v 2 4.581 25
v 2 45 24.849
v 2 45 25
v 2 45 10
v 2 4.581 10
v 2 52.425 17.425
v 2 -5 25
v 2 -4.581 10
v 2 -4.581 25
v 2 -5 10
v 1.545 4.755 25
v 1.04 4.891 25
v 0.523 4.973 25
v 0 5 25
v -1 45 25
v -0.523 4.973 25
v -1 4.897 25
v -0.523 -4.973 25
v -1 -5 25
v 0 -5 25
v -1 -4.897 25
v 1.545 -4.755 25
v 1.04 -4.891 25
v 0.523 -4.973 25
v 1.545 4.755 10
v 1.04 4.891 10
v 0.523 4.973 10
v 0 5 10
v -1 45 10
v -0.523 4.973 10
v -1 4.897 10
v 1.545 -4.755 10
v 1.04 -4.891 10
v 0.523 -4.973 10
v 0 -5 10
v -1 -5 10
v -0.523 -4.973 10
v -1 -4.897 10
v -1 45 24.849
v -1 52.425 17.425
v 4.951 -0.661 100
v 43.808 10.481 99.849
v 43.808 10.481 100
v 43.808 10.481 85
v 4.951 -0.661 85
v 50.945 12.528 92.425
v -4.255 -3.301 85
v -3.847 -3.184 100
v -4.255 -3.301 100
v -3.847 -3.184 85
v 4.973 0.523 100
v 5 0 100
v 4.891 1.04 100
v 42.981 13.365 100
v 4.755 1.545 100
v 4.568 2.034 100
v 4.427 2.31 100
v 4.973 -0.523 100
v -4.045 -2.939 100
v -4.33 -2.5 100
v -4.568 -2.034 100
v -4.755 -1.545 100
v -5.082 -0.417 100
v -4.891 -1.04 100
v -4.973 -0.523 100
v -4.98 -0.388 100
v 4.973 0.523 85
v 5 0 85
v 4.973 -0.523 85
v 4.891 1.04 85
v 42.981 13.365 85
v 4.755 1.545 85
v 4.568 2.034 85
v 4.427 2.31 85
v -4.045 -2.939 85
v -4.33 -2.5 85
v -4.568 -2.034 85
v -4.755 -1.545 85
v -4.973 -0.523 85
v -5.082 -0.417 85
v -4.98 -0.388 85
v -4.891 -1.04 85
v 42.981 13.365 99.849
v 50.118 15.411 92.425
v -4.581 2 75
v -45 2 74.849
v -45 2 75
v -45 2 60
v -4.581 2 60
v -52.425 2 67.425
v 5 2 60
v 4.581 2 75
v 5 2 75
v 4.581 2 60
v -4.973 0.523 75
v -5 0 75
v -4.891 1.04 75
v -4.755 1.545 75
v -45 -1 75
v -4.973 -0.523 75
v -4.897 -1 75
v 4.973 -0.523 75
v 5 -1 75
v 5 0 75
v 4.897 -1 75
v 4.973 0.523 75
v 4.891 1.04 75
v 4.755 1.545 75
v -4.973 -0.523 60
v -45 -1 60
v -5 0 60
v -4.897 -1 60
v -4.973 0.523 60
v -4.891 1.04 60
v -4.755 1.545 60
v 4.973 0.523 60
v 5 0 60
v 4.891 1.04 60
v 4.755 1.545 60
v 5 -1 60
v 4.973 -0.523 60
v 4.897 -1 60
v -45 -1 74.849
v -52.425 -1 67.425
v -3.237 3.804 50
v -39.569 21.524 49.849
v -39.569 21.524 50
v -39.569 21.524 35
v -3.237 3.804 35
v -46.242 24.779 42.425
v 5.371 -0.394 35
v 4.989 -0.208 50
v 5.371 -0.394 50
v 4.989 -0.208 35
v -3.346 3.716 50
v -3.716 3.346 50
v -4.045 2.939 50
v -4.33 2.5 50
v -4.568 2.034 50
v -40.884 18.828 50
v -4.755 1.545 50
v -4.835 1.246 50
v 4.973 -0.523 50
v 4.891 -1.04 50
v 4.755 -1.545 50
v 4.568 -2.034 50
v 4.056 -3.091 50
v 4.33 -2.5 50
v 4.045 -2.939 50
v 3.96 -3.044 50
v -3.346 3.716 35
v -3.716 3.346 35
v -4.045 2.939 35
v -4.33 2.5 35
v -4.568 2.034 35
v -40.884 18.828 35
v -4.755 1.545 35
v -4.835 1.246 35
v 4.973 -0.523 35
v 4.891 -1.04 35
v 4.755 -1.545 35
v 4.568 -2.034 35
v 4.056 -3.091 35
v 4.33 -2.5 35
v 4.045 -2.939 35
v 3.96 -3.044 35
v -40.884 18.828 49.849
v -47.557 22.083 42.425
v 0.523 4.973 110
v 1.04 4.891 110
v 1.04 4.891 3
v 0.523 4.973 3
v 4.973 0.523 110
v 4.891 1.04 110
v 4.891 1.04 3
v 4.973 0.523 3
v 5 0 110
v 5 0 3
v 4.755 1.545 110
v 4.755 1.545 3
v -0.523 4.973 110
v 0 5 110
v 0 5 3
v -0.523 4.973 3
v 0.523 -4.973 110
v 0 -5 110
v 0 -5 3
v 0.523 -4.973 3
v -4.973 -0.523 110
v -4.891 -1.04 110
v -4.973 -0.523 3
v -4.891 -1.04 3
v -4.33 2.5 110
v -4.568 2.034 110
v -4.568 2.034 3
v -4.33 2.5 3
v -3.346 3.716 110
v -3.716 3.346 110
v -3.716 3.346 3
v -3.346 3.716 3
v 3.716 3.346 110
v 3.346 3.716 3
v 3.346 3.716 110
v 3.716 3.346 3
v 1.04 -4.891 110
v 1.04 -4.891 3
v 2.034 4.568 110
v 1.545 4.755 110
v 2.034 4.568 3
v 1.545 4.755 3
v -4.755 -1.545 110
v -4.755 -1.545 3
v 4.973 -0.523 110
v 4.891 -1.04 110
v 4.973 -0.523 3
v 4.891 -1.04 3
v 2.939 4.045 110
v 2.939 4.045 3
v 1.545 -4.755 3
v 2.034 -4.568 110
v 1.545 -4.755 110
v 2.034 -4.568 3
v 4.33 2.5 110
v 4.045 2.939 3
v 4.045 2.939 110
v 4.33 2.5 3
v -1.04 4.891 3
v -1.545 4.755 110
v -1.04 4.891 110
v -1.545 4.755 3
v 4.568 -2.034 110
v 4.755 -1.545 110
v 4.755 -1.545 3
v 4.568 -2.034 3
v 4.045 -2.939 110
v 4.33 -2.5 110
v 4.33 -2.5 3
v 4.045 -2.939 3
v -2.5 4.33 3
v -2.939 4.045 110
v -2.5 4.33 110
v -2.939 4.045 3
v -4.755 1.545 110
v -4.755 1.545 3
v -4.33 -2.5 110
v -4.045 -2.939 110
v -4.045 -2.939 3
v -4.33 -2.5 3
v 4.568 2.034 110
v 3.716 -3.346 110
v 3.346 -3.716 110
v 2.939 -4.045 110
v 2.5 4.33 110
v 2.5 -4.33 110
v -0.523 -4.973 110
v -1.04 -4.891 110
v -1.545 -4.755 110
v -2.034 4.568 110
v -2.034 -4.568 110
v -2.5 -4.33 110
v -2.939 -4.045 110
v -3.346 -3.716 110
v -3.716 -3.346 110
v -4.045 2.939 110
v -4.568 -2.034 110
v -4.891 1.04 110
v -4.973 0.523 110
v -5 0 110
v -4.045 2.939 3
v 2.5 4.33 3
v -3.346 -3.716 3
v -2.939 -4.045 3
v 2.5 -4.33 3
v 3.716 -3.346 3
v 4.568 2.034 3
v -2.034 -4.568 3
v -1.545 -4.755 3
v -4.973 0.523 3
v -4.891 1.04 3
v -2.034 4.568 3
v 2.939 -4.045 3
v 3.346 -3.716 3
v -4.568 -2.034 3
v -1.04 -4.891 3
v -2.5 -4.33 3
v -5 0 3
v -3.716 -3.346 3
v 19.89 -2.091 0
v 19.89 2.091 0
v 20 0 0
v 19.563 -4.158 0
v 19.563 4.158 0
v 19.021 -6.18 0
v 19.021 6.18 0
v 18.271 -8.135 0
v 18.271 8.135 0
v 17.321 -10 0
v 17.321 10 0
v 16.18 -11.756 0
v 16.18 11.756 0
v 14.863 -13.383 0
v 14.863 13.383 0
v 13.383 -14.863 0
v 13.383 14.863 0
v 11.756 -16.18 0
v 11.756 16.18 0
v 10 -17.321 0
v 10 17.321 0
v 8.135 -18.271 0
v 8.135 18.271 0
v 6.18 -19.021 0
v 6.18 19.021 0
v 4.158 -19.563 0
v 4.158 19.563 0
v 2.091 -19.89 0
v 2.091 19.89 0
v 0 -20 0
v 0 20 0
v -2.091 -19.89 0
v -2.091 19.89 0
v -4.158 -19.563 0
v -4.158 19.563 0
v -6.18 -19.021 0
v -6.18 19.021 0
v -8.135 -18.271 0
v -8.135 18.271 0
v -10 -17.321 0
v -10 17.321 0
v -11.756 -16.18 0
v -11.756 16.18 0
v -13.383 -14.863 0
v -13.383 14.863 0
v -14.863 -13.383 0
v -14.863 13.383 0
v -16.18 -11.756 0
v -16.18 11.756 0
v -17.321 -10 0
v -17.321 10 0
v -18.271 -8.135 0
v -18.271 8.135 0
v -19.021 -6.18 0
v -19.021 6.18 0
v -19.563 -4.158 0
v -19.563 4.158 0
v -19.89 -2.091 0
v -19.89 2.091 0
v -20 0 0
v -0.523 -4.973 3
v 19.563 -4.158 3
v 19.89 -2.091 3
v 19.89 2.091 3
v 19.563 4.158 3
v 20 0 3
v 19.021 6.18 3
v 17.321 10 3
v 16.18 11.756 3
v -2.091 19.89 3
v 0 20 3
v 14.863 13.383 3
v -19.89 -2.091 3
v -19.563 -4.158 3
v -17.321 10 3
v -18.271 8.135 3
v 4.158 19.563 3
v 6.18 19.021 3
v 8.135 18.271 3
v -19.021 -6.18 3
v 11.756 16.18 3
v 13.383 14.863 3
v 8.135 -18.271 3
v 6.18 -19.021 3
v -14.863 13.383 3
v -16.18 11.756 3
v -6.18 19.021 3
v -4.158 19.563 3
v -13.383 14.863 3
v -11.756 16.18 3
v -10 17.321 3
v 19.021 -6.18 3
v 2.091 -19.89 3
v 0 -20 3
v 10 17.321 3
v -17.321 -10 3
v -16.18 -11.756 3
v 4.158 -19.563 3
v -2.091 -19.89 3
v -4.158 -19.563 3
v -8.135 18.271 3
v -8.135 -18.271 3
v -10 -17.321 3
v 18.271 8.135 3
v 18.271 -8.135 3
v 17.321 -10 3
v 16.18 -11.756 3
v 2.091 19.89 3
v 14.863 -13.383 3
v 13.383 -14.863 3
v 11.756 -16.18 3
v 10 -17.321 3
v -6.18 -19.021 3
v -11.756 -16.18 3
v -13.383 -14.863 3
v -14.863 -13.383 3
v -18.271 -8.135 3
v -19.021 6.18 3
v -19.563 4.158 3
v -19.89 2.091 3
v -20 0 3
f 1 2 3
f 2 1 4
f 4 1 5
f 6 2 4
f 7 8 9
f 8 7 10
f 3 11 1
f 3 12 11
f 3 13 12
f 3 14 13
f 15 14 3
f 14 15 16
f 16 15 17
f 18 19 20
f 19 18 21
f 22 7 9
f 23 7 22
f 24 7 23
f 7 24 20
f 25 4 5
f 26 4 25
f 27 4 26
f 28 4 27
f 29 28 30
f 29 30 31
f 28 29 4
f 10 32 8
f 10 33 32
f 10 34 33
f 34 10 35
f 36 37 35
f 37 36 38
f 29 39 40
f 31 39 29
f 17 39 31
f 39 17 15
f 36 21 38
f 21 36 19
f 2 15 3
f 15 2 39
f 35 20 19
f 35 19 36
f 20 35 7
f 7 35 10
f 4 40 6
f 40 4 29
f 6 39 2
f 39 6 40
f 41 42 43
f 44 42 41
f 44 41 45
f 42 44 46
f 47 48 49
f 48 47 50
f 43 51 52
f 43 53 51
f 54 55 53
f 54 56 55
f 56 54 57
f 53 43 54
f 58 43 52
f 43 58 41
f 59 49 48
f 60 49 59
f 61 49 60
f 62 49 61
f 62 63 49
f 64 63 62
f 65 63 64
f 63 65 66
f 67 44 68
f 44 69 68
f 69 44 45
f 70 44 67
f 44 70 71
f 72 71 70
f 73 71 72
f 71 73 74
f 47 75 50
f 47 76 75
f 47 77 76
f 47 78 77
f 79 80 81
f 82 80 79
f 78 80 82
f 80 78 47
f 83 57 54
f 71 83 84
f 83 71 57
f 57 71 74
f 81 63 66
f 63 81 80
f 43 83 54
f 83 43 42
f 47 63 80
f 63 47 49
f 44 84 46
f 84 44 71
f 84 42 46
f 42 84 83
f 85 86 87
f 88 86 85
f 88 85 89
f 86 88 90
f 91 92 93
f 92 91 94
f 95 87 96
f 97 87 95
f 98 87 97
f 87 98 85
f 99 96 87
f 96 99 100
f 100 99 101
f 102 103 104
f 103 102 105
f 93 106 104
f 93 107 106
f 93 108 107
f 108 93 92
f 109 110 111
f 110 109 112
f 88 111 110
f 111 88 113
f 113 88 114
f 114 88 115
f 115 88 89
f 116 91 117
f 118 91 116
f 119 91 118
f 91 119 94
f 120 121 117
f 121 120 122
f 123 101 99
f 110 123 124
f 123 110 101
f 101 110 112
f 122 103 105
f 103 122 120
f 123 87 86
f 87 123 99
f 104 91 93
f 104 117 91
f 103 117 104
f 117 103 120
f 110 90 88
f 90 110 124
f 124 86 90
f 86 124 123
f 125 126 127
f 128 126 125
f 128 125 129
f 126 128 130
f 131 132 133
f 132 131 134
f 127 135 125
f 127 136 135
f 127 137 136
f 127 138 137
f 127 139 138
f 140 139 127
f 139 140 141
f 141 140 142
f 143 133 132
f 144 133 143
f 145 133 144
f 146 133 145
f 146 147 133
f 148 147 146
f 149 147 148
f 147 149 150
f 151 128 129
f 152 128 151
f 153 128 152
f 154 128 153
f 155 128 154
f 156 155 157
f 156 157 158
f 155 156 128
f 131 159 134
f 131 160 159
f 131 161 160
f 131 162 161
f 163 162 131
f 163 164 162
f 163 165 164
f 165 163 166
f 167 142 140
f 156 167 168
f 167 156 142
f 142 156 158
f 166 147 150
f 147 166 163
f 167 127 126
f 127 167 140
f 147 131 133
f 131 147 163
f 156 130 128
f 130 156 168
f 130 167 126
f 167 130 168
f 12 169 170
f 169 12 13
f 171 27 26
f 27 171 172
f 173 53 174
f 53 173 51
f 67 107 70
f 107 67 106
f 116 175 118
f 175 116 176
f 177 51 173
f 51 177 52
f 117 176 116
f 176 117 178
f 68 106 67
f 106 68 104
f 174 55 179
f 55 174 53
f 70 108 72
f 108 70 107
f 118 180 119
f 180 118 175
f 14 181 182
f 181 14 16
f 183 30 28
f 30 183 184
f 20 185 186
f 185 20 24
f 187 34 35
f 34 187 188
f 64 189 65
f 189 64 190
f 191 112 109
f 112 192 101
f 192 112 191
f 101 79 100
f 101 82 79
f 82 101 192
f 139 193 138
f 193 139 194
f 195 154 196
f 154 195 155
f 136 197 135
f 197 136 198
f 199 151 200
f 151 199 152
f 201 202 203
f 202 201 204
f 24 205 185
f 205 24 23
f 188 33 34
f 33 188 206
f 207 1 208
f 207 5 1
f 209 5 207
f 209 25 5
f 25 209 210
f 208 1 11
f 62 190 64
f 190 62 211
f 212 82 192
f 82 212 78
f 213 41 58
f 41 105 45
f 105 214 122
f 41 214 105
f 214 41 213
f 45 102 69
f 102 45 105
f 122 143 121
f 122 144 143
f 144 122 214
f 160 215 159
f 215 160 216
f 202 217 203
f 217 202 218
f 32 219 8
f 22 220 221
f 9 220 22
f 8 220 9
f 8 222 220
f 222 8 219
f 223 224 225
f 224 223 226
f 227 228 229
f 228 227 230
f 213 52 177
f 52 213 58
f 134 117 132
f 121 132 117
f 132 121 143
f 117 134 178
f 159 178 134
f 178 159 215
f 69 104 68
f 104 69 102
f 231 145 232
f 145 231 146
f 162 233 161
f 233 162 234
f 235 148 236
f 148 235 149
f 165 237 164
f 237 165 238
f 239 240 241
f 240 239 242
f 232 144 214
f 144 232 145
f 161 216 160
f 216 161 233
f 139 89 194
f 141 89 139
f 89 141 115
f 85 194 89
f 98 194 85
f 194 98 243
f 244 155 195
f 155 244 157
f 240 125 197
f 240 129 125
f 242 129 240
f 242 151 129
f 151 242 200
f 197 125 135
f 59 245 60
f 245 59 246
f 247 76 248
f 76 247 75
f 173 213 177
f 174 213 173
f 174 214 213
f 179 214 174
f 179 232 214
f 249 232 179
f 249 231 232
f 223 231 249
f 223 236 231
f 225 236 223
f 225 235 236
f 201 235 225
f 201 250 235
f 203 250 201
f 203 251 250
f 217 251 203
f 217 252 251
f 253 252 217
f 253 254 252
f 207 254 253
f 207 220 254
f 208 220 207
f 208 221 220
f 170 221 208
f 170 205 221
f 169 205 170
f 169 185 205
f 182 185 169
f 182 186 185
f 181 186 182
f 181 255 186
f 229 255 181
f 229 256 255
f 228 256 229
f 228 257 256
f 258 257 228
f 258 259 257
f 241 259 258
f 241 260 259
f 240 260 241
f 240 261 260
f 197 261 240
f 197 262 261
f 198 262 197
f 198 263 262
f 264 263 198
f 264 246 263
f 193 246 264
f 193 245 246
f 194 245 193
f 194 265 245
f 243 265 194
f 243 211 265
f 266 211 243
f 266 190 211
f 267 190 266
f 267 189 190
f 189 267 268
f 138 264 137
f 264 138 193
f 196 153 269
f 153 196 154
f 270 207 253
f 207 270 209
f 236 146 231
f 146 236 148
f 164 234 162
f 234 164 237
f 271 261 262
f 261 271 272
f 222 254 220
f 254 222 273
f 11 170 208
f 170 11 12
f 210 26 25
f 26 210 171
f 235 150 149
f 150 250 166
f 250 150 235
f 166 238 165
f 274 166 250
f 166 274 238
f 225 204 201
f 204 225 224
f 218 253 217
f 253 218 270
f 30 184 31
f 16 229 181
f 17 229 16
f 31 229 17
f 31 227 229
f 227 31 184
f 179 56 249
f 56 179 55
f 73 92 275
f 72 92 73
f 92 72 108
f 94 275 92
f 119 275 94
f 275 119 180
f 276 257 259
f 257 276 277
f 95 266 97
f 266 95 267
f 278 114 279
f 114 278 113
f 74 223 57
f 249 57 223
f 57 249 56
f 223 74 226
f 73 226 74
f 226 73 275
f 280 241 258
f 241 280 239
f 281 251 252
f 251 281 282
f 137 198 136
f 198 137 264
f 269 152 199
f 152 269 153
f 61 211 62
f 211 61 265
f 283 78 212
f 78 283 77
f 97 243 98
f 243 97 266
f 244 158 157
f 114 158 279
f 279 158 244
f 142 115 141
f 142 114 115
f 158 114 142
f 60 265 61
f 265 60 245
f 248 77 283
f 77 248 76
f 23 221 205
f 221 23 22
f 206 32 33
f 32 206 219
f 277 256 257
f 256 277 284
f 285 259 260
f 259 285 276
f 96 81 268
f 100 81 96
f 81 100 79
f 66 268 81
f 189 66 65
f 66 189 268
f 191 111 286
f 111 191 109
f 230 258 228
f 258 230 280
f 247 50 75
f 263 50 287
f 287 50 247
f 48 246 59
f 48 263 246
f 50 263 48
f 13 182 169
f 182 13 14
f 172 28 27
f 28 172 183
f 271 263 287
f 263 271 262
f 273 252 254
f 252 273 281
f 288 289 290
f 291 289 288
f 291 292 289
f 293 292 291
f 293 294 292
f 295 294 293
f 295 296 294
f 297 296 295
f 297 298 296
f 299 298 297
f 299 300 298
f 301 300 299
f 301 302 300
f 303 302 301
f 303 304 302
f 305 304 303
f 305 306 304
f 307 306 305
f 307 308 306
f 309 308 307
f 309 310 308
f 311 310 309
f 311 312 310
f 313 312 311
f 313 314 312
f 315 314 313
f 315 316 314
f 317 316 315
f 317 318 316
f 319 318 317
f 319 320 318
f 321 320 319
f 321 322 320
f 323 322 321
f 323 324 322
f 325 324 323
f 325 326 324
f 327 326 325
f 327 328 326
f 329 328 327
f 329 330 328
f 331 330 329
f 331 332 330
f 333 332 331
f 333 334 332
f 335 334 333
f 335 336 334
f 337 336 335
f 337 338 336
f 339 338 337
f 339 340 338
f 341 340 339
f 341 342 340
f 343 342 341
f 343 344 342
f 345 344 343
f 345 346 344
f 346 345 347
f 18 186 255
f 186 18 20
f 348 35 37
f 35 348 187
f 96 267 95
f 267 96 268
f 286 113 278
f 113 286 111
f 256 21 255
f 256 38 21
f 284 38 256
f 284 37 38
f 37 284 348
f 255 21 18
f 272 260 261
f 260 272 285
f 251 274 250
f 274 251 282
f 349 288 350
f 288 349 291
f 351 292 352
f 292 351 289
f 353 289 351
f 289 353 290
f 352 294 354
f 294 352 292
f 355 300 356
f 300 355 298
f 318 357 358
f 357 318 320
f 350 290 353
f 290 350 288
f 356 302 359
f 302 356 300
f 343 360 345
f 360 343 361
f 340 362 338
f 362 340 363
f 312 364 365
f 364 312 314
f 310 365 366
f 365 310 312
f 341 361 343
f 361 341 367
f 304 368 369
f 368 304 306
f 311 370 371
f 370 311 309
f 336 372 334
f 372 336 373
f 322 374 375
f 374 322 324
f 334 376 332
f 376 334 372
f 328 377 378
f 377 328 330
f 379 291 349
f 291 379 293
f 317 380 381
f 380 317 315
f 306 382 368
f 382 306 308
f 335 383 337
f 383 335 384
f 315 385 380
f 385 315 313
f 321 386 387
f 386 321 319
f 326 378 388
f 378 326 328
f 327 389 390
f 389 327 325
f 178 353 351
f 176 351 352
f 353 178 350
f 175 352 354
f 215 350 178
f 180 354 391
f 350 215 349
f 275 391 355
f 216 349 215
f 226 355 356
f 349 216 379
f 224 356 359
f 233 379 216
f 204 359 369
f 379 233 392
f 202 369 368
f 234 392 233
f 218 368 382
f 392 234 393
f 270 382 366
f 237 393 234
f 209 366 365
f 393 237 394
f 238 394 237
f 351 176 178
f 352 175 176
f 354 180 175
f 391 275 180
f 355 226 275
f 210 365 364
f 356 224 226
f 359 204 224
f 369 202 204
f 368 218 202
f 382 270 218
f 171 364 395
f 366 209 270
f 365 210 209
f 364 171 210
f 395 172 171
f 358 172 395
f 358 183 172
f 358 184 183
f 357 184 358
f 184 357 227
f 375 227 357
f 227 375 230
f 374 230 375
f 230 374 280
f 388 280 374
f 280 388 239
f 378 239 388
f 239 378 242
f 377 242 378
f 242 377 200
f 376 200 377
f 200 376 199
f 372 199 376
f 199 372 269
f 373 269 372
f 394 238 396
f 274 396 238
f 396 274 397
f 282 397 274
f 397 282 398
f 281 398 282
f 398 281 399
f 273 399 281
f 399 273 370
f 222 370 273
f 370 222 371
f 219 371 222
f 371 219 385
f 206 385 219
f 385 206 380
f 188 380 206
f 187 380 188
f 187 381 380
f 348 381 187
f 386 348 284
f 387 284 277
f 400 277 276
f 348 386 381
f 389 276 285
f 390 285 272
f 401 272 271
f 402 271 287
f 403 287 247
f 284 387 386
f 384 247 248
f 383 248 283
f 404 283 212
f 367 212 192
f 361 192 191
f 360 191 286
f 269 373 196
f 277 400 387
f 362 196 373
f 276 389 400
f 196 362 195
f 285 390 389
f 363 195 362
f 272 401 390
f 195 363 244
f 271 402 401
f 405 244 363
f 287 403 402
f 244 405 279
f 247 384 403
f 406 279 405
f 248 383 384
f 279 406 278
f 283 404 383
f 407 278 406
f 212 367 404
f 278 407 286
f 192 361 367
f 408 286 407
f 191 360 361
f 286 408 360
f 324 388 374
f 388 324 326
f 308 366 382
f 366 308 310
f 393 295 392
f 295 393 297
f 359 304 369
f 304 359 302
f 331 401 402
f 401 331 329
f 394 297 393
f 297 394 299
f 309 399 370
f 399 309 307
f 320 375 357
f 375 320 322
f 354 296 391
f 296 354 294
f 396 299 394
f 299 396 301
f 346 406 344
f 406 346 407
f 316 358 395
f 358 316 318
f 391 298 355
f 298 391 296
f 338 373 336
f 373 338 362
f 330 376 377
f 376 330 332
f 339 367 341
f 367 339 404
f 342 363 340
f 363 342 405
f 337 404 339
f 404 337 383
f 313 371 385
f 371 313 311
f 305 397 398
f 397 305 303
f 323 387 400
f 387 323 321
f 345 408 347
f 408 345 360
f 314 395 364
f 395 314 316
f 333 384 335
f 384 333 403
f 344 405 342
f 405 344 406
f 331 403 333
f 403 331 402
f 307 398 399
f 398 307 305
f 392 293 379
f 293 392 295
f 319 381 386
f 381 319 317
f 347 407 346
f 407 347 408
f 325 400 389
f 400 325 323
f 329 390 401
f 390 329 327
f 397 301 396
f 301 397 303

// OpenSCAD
// Wegweiser
Stiel =true;
Weg=true;
Wegweiser=true;

module Wegweiser(){
        Weg();
        
        
        rotate([0,0,-74])
        translate([0,0,75])
        Weg();
        
        rotate([0,0,90])
        translate([0,0,50])
        Weg();
        
        rotate([0,0,64])
        translate([0,0,25])
        Weg();
}

module Stiel() {
    difference(){
        cylinder(d=10,h=110,$fn=60);
        Wegweiser();
    }
    
    cylinder(d=40,h=3,$fn=60);
}

module Weg(){
    translate([-1,-5,10]) {
        cube([3,50,15]);
        translate([0,50,0])
        rotate([45,0,0])
        cube([3,10.5,10.5]);
    }
}

if (Stiel) Stiel();
if (Weg) Weg();
if (Wegweiser) Wegweiser();
